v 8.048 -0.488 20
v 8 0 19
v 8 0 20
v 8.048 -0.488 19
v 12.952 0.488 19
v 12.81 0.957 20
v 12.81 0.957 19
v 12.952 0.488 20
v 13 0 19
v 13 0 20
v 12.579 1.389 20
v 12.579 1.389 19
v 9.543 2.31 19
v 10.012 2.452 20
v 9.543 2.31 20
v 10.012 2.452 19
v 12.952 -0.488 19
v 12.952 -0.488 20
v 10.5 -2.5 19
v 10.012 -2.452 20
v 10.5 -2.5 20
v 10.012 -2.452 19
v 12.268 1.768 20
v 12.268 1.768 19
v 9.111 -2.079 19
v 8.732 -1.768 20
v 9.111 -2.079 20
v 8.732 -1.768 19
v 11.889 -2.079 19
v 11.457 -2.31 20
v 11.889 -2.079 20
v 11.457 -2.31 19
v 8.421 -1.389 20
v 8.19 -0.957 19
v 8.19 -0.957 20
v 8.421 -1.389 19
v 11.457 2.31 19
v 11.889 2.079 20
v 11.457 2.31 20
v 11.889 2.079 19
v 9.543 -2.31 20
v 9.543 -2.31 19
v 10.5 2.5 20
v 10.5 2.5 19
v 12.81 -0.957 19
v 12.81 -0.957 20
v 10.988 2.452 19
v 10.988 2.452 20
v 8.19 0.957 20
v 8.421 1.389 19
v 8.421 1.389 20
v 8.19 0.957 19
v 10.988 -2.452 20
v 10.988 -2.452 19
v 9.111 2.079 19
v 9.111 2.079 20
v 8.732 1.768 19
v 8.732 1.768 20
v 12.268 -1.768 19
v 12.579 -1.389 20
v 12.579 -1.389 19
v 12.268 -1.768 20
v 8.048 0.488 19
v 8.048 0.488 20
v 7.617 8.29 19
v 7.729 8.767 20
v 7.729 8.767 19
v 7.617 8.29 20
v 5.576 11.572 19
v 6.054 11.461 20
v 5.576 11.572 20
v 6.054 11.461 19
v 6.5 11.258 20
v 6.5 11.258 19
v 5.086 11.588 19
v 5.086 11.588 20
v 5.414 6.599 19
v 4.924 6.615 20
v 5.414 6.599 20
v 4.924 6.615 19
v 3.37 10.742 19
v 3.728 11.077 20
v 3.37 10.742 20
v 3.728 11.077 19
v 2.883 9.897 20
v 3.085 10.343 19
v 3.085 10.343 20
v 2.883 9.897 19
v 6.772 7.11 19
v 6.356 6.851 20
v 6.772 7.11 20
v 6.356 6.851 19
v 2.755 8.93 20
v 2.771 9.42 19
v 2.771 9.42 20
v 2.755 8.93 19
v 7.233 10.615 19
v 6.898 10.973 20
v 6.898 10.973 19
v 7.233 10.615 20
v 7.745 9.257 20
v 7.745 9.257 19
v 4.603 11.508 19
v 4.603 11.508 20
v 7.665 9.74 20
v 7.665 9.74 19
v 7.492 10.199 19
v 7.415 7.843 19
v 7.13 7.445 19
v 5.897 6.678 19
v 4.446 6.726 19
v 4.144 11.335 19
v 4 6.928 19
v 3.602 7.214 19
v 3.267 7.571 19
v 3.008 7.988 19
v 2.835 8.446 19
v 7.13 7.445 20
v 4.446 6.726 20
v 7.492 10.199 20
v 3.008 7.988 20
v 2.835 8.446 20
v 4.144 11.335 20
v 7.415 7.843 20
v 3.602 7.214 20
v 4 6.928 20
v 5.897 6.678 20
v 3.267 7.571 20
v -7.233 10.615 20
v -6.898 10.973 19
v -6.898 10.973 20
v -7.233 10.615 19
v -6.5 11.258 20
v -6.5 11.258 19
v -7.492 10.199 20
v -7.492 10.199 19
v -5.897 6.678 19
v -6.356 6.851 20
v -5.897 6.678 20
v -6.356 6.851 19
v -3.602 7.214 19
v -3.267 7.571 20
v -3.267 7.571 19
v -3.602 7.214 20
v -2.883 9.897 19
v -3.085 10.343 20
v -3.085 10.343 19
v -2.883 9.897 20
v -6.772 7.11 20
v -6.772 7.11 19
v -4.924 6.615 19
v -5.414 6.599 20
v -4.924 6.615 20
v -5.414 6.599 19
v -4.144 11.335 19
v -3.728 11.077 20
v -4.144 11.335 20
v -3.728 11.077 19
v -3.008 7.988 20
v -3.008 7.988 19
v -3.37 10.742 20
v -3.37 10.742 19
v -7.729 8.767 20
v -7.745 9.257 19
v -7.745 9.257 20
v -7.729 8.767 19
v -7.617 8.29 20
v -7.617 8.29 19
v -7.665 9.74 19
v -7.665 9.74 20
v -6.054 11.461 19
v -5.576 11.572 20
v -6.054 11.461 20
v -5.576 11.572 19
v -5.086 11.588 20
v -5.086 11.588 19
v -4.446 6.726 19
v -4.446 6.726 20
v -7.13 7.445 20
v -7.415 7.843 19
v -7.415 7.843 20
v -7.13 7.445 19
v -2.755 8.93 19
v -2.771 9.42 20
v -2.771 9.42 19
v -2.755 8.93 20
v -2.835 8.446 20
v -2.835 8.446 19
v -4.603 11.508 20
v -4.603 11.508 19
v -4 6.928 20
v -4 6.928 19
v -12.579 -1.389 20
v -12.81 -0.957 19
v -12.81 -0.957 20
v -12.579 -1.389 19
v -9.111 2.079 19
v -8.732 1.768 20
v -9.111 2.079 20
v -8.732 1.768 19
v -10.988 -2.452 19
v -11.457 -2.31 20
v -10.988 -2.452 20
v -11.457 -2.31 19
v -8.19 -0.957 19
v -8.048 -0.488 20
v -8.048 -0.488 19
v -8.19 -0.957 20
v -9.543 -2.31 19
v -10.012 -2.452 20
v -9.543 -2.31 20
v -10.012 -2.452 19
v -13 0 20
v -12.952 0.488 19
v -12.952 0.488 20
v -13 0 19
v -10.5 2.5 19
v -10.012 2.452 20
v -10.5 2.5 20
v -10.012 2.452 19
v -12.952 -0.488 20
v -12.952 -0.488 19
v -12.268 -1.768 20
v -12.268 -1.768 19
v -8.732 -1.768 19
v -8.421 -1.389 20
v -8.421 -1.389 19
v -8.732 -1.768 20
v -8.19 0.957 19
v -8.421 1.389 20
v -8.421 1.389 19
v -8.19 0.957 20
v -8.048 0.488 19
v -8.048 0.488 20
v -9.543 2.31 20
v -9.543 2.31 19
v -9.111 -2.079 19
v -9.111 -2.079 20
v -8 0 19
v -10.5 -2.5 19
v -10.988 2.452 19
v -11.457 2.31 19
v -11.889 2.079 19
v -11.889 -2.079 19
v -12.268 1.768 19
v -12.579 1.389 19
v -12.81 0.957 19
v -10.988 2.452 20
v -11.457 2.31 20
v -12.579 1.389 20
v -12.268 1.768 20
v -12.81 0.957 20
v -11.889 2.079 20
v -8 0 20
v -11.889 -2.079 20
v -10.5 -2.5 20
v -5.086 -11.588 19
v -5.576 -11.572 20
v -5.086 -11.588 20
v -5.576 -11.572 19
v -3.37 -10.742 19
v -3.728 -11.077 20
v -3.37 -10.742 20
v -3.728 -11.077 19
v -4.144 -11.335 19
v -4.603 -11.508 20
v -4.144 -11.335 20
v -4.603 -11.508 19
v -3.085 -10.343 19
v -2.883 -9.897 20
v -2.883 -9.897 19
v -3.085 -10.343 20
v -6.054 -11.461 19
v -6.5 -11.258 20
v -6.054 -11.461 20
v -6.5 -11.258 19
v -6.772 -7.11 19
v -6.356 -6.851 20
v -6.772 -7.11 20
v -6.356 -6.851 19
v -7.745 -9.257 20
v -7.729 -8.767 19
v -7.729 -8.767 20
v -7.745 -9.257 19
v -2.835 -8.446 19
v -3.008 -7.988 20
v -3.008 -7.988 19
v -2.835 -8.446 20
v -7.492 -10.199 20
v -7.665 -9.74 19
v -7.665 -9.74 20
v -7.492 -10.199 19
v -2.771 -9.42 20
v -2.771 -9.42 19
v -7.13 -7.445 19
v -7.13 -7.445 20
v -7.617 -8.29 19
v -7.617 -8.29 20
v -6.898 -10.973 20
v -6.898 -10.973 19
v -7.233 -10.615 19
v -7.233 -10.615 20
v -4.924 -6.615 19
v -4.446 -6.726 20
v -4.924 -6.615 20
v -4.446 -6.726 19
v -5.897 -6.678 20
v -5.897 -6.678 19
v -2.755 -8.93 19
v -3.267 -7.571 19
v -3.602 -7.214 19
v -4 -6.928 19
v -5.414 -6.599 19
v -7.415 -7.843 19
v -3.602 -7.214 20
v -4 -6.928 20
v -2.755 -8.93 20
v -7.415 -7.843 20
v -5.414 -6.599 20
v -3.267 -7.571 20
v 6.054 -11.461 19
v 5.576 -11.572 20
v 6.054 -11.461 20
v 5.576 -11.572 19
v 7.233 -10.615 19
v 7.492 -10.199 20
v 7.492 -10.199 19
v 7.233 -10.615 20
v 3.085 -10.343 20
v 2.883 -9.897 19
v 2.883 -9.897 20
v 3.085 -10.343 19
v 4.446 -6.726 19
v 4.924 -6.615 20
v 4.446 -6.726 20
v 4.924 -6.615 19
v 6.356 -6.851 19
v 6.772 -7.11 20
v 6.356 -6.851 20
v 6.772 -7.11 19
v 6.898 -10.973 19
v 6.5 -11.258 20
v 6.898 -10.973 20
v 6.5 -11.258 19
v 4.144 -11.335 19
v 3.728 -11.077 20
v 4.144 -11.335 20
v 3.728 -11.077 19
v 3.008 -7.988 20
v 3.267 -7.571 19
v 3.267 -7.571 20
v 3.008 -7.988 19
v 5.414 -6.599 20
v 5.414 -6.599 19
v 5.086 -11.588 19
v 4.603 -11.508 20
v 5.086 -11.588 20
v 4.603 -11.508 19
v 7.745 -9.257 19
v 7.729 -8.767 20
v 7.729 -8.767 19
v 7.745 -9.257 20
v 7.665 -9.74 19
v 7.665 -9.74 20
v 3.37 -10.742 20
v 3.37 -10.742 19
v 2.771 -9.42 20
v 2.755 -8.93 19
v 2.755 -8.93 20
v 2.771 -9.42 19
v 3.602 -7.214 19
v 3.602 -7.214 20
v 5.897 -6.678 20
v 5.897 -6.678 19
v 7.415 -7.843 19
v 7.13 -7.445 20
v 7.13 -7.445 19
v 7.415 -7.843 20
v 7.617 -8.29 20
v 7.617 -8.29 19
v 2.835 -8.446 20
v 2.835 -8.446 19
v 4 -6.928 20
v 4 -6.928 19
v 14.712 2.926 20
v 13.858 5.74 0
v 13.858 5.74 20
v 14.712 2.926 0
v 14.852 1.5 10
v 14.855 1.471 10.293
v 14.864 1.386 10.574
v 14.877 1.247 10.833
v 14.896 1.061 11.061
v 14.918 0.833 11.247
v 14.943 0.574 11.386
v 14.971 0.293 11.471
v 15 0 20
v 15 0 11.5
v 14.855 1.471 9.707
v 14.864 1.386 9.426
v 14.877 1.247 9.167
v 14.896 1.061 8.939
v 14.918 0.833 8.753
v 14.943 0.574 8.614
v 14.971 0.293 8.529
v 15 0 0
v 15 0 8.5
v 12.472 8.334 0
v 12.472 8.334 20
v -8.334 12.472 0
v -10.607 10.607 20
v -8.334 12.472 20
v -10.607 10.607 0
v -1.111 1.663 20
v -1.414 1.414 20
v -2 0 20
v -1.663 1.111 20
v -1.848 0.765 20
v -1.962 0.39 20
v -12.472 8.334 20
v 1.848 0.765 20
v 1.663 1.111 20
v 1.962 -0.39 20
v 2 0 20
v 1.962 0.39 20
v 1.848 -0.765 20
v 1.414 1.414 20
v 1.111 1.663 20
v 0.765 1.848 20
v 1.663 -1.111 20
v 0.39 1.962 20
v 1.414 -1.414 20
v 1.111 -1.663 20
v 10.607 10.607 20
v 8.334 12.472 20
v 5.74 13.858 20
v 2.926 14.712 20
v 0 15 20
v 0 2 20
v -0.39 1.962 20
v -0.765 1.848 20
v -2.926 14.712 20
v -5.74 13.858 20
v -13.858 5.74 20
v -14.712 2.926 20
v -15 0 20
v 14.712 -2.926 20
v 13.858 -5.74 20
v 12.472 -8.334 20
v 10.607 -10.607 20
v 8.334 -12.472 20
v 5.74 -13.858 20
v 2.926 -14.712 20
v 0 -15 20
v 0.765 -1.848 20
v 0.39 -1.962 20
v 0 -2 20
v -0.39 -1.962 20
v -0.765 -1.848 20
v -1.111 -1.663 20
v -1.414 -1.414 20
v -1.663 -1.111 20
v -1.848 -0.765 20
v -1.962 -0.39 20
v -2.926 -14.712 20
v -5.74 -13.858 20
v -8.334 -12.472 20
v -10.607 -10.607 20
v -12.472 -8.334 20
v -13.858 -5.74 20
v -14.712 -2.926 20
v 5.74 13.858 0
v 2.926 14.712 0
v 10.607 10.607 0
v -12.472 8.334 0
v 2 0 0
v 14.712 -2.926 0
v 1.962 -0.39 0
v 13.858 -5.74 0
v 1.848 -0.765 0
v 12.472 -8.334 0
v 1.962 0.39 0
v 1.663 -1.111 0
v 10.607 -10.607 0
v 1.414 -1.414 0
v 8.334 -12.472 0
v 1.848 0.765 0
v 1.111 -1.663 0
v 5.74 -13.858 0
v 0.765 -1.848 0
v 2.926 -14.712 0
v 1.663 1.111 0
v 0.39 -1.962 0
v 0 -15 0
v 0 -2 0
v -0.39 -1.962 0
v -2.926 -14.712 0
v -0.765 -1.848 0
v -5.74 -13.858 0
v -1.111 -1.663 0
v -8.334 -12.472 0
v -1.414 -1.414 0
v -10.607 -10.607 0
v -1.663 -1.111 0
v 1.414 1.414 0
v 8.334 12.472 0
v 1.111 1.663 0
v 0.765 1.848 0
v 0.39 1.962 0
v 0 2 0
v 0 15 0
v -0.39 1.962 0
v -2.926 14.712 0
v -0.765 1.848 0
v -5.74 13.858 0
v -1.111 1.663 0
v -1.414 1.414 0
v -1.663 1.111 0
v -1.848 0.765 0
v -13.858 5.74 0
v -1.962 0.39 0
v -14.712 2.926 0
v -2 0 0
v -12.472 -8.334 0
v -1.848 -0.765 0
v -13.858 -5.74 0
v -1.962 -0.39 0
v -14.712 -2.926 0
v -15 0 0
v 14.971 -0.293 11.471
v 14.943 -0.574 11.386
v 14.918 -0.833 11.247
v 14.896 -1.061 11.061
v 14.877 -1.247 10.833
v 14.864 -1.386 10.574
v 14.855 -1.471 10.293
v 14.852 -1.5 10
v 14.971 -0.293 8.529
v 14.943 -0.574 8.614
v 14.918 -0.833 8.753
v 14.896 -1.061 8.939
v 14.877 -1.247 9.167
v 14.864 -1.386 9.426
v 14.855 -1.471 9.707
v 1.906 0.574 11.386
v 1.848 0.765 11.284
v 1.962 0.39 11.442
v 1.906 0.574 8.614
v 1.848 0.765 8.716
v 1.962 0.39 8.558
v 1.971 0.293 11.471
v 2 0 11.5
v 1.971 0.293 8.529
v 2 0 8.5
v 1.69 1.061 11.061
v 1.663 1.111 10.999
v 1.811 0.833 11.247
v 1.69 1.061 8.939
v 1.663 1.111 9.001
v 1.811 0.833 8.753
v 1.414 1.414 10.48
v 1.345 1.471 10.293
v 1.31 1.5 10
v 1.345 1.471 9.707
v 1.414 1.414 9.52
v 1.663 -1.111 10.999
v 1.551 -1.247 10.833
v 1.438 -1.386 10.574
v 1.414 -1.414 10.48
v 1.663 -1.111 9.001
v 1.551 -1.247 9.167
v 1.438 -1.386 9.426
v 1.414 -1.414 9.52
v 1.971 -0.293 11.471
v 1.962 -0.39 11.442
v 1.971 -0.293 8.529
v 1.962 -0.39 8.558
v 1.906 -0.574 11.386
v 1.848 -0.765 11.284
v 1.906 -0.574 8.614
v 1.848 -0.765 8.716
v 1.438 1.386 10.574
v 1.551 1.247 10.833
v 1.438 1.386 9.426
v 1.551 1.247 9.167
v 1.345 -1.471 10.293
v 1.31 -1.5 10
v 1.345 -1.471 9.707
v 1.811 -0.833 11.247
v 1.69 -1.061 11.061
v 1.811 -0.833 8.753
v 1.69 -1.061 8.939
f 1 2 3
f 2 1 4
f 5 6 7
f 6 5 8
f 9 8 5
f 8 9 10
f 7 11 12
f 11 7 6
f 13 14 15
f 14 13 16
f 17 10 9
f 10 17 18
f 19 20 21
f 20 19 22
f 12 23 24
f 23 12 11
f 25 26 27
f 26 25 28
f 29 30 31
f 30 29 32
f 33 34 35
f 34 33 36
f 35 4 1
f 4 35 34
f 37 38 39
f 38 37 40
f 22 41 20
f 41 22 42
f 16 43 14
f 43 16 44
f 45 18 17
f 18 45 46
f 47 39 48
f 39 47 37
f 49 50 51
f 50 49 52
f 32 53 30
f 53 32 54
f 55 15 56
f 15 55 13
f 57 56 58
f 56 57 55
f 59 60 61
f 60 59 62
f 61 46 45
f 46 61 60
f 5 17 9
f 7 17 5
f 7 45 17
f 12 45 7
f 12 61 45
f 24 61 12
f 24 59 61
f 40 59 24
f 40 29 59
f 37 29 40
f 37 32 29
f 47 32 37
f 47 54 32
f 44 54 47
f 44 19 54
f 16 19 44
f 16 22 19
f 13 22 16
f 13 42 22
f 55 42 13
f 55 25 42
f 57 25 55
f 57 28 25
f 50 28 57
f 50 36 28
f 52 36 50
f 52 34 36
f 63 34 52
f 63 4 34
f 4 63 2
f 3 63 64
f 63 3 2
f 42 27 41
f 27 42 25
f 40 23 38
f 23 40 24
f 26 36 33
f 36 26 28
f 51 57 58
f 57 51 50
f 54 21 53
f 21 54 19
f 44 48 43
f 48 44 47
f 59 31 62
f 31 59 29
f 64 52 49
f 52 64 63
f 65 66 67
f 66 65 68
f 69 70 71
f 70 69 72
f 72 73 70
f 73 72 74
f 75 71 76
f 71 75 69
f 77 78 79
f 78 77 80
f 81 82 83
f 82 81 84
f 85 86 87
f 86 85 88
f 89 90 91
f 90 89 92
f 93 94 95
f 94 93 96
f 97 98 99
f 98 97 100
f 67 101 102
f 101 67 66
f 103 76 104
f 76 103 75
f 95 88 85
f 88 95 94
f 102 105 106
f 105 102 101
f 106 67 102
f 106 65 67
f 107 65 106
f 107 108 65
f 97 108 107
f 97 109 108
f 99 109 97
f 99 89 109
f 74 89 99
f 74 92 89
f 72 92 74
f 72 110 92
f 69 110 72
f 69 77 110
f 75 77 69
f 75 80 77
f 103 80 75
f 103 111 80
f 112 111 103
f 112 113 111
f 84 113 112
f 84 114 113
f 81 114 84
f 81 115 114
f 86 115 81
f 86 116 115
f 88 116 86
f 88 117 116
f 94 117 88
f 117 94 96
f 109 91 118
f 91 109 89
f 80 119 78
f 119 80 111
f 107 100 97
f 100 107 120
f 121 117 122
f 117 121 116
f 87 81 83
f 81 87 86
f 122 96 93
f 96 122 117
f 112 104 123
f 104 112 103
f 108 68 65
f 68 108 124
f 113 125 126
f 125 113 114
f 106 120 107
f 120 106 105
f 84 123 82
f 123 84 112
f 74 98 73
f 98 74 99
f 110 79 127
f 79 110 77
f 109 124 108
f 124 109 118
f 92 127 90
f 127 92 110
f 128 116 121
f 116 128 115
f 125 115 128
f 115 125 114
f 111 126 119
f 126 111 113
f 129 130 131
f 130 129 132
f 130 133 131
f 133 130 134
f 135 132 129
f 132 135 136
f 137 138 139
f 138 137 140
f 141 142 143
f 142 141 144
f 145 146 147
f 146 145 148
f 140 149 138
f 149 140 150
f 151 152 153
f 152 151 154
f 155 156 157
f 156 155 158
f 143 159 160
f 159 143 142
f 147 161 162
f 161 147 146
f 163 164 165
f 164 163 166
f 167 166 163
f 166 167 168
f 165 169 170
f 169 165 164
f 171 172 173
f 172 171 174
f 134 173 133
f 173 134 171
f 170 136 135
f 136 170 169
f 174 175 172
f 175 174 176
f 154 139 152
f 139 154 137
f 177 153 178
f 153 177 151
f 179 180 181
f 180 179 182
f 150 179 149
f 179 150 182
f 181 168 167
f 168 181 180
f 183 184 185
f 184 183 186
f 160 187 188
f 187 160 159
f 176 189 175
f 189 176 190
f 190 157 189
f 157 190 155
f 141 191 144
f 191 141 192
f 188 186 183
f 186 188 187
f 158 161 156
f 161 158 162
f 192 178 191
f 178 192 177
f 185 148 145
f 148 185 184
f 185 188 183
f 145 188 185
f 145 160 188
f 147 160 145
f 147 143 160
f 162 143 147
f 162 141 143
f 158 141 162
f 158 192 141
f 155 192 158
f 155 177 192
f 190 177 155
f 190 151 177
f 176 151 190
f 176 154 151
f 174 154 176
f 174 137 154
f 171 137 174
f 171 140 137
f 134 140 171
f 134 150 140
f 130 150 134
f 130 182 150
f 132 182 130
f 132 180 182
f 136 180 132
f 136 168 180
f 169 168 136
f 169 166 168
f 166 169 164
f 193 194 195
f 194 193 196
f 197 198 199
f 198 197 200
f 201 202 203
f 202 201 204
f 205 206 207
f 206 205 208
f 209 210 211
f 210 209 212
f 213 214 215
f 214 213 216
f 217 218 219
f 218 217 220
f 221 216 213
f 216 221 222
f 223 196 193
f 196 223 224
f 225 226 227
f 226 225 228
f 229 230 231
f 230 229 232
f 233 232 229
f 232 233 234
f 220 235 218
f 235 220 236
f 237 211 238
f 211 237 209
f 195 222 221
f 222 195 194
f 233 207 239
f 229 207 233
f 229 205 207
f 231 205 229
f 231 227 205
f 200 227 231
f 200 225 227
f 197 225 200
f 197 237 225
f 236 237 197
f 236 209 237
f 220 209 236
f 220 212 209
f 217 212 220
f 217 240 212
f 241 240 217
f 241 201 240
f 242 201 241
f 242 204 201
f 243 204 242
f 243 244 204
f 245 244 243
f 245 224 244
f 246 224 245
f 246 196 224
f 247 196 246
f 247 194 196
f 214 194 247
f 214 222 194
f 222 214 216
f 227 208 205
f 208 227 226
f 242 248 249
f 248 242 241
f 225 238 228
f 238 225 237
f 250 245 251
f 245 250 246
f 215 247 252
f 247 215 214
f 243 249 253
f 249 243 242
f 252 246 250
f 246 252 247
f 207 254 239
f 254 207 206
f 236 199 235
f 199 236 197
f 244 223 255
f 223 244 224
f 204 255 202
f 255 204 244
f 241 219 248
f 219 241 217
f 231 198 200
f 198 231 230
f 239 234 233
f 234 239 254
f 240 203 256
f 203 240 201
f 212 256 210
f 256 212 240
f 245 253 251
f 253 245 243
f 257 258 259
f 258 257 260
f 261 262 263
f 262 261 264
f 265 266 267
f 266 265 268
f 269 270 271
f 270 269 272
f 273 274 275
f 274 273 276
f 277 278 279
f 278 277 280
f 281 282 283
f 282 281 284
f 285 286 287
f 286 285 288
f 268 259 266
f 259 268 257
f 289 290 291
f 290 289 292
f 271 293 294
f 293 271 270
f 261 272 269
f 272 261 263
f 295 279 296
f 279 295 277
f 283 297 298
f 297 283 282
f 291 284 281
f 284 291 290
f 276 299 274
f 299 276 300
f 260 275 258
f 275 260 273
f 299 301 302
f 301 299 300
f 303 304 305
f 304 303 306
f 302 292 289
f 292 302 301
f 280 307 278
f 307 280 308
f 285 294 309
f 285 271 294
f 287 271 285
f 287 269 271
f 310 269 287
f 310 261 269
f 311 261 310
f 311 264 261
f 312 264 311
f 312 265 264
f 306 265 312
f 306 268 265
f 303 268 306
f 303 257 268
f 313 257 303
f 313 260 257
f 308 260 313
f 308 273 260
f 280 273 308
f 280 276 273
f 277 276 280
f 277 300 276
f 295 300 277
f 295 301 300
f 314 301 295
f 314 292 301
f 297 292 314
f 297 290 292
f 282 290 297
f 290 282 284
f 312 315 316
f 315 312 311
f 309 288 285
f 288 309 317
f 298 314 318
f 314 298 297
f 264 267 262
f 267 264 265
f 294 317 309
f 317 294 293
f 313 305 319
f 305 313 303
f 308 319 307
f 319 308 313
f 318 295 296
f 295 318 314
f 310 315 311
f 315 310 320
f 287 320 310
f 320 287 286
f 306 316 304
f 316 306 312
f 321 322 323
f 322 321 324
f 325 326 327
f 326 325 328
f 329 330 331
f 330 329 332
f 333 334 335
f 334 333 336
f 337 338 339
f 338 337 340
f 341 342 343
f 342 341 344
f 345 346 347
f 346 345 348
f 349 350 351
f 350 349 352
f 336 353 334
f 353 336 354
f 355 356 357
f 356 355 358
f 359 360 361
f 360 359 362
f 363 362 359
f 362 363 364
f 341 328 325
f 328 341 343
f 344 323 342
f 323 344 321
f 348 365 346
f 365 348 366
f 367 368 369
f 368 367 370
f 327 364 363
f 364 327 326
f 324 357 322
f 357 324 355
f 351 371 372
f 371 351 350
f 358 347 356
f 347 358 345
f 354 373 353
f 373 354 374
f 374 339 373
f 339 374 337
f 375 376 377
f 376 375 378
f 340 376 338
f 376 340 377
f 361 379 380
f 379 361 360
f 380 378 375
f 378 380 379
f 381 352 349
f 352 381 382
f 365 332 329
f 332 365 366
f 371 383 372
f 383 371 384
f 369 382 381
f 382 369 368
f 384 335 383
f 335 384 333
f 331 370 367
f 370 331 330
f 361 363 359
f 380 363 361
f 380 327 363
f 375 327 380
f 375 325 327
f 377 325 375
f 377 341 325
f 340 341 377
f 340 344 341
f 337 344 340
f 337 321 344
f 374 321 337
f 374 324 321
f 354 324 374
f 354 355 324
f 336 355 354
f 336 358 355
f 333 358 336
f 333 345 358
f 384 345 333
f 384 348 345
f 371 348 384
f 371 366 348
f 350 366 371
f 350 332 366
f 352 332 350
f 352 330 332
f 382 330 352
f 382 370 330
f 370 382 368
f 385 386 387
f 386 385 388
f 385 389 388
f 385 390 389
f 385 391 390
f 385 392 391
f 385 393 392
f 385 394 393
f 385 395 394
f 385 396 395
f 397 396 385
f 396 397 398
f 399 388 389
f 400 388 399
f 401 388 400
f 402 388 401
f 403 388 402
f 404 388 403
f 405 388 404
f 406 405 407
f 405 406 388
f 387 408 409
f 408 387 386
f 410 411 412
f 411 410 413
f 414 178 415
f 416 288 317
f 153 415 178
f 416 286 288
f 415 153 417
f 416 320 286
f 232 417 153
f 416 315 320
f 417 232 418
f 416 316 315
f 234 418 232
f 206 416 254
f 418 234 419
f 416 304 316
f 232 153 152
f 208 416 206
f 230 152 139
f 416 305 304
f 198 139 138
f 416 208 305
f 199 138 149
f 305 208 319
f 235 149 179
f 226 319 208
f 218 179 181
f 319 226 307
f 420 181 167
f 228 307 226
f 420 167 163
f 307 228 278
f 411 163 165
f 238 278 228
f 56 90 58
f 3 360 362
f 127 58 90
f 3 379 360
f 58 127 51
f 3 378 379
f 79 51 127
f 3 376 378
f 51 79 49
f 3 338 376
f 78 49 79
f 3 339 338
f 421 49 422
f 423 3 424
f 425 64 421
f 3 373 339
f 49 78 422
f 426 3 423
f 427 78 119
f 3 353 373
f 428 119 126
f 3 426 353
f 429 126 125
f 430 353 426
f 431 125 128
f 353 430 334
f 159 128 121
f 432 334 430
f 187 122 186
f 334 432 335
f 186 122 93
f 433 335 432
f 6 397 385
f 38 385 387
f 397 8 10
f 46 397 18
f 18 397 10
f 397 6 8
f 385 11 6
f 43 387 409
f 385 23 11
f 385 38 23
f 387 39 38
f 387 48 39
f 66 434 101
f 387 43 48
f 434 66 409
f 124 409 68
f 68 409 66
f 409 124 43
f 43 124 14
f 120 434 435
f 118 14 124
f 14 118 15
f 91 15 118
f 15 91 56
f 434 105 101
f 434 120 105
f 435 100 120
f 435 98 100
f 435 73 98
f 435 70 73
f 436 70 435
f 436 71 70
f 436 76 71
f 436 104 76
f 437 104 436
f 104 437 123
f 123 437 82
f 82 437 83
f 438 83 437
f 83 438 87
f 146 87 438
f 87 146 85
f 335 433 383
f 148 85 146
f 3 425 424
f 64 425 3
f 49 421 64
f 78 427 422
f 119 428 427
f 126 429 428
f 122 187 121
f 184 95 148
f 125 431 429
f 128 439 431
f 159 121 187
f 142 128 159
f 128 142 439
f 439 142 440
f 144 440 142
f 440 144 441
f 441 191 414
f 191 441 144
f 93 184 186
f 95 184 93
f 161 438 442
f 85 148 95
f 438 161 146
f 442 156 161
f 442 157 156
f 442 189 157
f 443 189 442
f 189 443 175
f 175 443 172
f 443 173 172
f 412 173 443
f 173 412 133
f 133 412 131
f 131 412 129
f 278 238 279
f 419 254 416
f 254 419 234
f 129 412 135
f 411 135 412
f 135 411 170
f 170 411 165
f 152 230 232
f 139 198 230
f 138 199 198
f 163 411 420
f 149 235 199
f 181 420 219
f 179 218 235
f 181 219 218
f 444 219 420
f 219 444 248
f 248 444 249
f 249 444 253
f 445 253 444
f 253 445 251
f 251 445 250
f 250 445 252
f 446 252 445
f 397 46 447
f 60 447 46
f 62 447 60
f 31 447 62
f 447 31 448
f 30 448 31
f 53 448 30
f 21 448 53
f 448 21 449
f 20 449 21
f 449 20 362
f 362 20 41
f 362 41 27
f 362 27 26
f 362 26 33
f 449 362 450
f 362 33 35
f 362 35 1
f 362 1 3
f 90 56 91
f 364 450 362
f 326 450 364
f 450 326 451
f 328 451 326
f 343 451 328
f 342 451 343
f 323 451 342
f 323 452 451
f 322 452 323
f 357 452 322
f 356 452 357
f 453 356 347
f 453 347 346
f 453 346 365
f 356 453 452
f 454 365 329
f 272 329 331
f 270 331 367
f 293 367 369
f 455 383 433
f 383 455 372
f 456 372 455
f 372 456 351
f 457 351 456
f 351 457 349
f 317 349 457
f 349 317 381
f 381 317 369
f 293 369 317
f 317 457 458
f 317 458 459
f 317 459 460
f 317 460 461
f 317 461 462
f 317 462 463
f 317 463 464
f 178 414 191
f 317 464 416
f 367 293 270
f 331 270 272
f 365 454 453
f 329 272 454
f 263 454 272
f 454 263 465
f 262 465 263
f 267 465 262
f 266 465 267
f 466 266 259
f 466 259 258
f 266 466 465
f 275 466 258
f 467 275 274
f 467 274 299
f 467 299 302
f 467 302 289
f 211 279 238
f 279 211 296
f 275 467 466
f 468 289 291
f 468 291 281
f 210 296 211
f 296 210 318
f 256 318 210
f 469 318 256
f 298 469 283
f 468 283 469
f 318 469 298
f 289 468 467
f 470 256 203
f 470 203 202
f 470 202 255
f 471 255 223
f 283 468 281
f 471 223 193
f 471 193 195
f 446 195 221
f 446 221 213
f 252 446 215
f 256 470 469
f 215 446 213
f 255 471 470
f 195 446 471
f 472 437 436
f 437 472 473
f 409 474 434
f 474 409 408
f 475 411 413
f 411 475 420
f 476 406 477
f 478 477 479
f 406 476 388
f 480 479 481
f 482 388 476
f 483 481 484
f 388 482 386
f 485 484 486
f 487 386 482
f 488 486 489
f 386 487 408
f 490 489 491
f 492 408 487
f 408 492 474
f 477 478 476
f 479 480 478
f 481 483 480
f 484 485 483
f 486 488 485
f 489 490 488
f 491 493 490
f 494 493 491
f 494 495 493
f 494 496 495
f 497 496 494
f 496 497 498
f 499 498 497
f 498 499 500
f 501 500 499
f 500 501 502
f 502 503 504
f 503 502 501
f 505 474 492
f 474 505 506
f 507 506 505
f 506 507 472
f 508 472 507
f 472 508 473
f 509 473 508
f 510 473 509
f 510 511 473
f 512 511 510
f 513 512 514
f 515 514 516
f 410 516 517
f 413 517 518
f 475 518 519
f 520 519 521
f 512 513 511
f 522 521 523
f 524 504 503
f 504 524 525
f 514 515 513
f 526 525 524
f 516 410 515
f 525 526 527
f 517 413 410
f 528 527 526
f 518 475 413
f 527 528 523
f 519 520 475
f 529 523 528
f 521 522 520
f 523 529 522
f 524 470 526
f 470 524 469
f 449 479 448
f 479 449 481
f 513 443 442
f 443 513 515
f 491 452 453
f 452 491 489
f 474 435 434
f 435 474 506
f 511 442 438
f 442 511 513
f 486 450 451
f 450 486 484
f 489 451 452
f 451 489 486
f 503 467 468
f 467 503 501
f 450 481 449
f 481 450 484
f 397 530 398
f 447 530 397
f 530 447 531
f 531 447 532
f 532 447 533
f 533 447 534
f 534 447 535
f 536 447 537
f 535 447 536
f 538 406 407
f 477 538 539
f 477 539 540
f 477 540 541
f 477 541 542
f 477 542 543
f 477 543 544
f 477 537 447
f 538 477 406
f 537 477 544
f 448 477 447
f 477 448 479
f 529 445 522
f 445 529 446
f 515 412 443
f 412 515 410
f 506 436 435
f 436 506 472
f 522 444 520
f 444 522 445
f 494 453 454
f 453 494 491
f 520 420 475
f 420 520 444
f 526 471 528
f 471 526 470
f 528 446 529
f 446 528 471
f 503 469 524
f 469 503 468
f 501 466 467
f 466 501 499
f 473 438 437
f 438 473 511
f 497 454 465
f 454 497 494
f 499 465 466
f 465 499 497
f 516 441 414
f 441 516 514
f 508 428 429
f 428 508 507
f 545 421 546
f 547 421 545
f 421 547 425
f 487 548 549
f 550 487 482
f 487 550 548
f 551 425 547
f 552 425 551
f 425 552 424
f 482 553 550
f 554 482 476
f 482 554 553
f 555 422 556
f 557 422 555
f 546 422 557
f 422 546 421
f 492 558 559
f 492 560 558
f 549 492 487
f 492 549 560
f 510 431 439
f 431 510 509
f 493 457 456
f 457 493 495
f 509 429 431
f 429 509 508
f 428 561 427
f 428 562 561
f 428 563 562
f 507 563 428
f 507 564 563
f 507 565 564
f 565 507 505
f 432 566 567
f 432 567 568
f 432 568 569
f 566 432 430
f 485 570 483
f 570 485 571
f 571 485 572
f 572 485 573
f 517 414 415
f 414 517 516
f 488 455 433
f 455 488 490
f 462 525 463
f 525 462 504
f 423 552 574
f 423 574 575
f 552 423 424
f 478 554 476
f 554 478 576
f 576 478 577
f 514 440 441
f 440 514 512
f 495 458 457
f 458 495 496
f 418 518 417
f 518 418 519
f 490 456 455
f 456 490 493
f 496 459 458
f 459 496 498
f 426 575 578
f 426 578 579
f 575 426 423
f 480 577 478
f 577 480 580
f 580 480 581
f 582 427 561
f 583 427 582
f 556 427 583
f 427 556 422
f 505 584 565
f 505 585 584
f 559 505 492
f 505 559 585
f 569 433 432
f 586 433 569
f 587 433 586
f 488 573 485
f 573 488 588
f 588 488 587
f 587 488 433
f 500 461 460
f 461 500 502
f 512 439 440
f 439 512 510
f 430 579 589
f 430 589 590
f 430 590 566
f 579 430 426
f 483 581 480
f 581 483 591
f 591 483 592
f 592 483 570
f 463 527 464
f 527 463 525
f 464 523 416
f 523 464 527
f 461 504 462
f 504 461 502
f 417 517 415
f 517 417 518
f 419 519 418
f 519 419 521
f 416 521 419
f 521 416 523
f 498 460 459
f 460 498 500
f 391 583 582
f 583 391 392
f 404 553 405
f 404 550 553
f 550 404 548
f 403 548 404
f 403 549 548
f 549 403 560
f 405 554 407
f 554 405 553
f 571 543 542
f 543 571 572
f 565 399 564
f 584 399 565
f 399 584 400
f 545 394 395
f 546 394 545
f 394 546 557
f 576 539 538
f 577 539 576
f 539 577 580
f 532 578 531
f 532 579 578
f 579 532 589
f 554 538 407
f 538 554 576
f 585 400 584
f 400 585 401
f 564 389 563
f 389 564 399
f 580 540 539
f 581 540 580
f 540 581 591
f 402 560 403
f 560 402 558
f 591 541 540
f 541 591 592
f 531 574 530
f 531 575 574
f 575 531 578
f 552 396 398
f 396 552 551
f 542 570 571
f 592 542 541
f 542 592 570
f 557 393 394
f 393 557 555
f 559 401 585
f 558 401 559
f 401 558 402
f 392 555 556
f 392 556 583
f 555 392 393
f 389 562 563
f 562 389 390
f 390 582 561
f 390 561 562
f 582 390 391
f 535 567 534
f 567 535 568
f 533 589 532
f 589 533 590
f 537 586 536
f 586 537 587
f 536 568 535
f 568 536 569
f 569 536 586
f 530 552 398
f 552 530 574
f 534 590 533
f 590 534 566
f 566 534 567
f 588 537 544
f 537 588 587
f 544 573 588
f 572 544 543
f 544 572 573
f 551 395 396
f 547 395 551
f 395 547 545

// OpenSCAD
$fn = 32;

// ----------------------------------------------------------------------
// Control knob: dimpled knob
// ----------------------------------------------------------------------

// --- parameters (mm) ---
dimp_d = 5;               // finger dimple diameter
n_dimp = 6;               // number of dimples
dimp_r = 10.5;            // dimple ring radius
knob_d = 30;              // knob body diameter
knob_h = 20;              // knob body height
bore_d = 4;               // shaft bore diameter
set_d = 3;                // set screw bore diameter

dimp_step = 360 / n_dimp;  // dimple angular step

difference() {
  cylinder(h = knob_h, d = knob_d);
  translate([0, 0, -1]) cylinder(h = knob_h + 2, d = bore_d);
  translate([-1, 0, knob_h / 2]) rotate([0, 90, 0])
    cylinder(h = knob_d / 2 + bore_d / 2 + 2, d = set_d);  for (i = [0 : n_dimp - 1])
    rotate([0, 0, i * dimp_step])
      translate([dimp_r, 0, knob_h - 1])
        cylinder(h = 2, d = dimp_d);
}
